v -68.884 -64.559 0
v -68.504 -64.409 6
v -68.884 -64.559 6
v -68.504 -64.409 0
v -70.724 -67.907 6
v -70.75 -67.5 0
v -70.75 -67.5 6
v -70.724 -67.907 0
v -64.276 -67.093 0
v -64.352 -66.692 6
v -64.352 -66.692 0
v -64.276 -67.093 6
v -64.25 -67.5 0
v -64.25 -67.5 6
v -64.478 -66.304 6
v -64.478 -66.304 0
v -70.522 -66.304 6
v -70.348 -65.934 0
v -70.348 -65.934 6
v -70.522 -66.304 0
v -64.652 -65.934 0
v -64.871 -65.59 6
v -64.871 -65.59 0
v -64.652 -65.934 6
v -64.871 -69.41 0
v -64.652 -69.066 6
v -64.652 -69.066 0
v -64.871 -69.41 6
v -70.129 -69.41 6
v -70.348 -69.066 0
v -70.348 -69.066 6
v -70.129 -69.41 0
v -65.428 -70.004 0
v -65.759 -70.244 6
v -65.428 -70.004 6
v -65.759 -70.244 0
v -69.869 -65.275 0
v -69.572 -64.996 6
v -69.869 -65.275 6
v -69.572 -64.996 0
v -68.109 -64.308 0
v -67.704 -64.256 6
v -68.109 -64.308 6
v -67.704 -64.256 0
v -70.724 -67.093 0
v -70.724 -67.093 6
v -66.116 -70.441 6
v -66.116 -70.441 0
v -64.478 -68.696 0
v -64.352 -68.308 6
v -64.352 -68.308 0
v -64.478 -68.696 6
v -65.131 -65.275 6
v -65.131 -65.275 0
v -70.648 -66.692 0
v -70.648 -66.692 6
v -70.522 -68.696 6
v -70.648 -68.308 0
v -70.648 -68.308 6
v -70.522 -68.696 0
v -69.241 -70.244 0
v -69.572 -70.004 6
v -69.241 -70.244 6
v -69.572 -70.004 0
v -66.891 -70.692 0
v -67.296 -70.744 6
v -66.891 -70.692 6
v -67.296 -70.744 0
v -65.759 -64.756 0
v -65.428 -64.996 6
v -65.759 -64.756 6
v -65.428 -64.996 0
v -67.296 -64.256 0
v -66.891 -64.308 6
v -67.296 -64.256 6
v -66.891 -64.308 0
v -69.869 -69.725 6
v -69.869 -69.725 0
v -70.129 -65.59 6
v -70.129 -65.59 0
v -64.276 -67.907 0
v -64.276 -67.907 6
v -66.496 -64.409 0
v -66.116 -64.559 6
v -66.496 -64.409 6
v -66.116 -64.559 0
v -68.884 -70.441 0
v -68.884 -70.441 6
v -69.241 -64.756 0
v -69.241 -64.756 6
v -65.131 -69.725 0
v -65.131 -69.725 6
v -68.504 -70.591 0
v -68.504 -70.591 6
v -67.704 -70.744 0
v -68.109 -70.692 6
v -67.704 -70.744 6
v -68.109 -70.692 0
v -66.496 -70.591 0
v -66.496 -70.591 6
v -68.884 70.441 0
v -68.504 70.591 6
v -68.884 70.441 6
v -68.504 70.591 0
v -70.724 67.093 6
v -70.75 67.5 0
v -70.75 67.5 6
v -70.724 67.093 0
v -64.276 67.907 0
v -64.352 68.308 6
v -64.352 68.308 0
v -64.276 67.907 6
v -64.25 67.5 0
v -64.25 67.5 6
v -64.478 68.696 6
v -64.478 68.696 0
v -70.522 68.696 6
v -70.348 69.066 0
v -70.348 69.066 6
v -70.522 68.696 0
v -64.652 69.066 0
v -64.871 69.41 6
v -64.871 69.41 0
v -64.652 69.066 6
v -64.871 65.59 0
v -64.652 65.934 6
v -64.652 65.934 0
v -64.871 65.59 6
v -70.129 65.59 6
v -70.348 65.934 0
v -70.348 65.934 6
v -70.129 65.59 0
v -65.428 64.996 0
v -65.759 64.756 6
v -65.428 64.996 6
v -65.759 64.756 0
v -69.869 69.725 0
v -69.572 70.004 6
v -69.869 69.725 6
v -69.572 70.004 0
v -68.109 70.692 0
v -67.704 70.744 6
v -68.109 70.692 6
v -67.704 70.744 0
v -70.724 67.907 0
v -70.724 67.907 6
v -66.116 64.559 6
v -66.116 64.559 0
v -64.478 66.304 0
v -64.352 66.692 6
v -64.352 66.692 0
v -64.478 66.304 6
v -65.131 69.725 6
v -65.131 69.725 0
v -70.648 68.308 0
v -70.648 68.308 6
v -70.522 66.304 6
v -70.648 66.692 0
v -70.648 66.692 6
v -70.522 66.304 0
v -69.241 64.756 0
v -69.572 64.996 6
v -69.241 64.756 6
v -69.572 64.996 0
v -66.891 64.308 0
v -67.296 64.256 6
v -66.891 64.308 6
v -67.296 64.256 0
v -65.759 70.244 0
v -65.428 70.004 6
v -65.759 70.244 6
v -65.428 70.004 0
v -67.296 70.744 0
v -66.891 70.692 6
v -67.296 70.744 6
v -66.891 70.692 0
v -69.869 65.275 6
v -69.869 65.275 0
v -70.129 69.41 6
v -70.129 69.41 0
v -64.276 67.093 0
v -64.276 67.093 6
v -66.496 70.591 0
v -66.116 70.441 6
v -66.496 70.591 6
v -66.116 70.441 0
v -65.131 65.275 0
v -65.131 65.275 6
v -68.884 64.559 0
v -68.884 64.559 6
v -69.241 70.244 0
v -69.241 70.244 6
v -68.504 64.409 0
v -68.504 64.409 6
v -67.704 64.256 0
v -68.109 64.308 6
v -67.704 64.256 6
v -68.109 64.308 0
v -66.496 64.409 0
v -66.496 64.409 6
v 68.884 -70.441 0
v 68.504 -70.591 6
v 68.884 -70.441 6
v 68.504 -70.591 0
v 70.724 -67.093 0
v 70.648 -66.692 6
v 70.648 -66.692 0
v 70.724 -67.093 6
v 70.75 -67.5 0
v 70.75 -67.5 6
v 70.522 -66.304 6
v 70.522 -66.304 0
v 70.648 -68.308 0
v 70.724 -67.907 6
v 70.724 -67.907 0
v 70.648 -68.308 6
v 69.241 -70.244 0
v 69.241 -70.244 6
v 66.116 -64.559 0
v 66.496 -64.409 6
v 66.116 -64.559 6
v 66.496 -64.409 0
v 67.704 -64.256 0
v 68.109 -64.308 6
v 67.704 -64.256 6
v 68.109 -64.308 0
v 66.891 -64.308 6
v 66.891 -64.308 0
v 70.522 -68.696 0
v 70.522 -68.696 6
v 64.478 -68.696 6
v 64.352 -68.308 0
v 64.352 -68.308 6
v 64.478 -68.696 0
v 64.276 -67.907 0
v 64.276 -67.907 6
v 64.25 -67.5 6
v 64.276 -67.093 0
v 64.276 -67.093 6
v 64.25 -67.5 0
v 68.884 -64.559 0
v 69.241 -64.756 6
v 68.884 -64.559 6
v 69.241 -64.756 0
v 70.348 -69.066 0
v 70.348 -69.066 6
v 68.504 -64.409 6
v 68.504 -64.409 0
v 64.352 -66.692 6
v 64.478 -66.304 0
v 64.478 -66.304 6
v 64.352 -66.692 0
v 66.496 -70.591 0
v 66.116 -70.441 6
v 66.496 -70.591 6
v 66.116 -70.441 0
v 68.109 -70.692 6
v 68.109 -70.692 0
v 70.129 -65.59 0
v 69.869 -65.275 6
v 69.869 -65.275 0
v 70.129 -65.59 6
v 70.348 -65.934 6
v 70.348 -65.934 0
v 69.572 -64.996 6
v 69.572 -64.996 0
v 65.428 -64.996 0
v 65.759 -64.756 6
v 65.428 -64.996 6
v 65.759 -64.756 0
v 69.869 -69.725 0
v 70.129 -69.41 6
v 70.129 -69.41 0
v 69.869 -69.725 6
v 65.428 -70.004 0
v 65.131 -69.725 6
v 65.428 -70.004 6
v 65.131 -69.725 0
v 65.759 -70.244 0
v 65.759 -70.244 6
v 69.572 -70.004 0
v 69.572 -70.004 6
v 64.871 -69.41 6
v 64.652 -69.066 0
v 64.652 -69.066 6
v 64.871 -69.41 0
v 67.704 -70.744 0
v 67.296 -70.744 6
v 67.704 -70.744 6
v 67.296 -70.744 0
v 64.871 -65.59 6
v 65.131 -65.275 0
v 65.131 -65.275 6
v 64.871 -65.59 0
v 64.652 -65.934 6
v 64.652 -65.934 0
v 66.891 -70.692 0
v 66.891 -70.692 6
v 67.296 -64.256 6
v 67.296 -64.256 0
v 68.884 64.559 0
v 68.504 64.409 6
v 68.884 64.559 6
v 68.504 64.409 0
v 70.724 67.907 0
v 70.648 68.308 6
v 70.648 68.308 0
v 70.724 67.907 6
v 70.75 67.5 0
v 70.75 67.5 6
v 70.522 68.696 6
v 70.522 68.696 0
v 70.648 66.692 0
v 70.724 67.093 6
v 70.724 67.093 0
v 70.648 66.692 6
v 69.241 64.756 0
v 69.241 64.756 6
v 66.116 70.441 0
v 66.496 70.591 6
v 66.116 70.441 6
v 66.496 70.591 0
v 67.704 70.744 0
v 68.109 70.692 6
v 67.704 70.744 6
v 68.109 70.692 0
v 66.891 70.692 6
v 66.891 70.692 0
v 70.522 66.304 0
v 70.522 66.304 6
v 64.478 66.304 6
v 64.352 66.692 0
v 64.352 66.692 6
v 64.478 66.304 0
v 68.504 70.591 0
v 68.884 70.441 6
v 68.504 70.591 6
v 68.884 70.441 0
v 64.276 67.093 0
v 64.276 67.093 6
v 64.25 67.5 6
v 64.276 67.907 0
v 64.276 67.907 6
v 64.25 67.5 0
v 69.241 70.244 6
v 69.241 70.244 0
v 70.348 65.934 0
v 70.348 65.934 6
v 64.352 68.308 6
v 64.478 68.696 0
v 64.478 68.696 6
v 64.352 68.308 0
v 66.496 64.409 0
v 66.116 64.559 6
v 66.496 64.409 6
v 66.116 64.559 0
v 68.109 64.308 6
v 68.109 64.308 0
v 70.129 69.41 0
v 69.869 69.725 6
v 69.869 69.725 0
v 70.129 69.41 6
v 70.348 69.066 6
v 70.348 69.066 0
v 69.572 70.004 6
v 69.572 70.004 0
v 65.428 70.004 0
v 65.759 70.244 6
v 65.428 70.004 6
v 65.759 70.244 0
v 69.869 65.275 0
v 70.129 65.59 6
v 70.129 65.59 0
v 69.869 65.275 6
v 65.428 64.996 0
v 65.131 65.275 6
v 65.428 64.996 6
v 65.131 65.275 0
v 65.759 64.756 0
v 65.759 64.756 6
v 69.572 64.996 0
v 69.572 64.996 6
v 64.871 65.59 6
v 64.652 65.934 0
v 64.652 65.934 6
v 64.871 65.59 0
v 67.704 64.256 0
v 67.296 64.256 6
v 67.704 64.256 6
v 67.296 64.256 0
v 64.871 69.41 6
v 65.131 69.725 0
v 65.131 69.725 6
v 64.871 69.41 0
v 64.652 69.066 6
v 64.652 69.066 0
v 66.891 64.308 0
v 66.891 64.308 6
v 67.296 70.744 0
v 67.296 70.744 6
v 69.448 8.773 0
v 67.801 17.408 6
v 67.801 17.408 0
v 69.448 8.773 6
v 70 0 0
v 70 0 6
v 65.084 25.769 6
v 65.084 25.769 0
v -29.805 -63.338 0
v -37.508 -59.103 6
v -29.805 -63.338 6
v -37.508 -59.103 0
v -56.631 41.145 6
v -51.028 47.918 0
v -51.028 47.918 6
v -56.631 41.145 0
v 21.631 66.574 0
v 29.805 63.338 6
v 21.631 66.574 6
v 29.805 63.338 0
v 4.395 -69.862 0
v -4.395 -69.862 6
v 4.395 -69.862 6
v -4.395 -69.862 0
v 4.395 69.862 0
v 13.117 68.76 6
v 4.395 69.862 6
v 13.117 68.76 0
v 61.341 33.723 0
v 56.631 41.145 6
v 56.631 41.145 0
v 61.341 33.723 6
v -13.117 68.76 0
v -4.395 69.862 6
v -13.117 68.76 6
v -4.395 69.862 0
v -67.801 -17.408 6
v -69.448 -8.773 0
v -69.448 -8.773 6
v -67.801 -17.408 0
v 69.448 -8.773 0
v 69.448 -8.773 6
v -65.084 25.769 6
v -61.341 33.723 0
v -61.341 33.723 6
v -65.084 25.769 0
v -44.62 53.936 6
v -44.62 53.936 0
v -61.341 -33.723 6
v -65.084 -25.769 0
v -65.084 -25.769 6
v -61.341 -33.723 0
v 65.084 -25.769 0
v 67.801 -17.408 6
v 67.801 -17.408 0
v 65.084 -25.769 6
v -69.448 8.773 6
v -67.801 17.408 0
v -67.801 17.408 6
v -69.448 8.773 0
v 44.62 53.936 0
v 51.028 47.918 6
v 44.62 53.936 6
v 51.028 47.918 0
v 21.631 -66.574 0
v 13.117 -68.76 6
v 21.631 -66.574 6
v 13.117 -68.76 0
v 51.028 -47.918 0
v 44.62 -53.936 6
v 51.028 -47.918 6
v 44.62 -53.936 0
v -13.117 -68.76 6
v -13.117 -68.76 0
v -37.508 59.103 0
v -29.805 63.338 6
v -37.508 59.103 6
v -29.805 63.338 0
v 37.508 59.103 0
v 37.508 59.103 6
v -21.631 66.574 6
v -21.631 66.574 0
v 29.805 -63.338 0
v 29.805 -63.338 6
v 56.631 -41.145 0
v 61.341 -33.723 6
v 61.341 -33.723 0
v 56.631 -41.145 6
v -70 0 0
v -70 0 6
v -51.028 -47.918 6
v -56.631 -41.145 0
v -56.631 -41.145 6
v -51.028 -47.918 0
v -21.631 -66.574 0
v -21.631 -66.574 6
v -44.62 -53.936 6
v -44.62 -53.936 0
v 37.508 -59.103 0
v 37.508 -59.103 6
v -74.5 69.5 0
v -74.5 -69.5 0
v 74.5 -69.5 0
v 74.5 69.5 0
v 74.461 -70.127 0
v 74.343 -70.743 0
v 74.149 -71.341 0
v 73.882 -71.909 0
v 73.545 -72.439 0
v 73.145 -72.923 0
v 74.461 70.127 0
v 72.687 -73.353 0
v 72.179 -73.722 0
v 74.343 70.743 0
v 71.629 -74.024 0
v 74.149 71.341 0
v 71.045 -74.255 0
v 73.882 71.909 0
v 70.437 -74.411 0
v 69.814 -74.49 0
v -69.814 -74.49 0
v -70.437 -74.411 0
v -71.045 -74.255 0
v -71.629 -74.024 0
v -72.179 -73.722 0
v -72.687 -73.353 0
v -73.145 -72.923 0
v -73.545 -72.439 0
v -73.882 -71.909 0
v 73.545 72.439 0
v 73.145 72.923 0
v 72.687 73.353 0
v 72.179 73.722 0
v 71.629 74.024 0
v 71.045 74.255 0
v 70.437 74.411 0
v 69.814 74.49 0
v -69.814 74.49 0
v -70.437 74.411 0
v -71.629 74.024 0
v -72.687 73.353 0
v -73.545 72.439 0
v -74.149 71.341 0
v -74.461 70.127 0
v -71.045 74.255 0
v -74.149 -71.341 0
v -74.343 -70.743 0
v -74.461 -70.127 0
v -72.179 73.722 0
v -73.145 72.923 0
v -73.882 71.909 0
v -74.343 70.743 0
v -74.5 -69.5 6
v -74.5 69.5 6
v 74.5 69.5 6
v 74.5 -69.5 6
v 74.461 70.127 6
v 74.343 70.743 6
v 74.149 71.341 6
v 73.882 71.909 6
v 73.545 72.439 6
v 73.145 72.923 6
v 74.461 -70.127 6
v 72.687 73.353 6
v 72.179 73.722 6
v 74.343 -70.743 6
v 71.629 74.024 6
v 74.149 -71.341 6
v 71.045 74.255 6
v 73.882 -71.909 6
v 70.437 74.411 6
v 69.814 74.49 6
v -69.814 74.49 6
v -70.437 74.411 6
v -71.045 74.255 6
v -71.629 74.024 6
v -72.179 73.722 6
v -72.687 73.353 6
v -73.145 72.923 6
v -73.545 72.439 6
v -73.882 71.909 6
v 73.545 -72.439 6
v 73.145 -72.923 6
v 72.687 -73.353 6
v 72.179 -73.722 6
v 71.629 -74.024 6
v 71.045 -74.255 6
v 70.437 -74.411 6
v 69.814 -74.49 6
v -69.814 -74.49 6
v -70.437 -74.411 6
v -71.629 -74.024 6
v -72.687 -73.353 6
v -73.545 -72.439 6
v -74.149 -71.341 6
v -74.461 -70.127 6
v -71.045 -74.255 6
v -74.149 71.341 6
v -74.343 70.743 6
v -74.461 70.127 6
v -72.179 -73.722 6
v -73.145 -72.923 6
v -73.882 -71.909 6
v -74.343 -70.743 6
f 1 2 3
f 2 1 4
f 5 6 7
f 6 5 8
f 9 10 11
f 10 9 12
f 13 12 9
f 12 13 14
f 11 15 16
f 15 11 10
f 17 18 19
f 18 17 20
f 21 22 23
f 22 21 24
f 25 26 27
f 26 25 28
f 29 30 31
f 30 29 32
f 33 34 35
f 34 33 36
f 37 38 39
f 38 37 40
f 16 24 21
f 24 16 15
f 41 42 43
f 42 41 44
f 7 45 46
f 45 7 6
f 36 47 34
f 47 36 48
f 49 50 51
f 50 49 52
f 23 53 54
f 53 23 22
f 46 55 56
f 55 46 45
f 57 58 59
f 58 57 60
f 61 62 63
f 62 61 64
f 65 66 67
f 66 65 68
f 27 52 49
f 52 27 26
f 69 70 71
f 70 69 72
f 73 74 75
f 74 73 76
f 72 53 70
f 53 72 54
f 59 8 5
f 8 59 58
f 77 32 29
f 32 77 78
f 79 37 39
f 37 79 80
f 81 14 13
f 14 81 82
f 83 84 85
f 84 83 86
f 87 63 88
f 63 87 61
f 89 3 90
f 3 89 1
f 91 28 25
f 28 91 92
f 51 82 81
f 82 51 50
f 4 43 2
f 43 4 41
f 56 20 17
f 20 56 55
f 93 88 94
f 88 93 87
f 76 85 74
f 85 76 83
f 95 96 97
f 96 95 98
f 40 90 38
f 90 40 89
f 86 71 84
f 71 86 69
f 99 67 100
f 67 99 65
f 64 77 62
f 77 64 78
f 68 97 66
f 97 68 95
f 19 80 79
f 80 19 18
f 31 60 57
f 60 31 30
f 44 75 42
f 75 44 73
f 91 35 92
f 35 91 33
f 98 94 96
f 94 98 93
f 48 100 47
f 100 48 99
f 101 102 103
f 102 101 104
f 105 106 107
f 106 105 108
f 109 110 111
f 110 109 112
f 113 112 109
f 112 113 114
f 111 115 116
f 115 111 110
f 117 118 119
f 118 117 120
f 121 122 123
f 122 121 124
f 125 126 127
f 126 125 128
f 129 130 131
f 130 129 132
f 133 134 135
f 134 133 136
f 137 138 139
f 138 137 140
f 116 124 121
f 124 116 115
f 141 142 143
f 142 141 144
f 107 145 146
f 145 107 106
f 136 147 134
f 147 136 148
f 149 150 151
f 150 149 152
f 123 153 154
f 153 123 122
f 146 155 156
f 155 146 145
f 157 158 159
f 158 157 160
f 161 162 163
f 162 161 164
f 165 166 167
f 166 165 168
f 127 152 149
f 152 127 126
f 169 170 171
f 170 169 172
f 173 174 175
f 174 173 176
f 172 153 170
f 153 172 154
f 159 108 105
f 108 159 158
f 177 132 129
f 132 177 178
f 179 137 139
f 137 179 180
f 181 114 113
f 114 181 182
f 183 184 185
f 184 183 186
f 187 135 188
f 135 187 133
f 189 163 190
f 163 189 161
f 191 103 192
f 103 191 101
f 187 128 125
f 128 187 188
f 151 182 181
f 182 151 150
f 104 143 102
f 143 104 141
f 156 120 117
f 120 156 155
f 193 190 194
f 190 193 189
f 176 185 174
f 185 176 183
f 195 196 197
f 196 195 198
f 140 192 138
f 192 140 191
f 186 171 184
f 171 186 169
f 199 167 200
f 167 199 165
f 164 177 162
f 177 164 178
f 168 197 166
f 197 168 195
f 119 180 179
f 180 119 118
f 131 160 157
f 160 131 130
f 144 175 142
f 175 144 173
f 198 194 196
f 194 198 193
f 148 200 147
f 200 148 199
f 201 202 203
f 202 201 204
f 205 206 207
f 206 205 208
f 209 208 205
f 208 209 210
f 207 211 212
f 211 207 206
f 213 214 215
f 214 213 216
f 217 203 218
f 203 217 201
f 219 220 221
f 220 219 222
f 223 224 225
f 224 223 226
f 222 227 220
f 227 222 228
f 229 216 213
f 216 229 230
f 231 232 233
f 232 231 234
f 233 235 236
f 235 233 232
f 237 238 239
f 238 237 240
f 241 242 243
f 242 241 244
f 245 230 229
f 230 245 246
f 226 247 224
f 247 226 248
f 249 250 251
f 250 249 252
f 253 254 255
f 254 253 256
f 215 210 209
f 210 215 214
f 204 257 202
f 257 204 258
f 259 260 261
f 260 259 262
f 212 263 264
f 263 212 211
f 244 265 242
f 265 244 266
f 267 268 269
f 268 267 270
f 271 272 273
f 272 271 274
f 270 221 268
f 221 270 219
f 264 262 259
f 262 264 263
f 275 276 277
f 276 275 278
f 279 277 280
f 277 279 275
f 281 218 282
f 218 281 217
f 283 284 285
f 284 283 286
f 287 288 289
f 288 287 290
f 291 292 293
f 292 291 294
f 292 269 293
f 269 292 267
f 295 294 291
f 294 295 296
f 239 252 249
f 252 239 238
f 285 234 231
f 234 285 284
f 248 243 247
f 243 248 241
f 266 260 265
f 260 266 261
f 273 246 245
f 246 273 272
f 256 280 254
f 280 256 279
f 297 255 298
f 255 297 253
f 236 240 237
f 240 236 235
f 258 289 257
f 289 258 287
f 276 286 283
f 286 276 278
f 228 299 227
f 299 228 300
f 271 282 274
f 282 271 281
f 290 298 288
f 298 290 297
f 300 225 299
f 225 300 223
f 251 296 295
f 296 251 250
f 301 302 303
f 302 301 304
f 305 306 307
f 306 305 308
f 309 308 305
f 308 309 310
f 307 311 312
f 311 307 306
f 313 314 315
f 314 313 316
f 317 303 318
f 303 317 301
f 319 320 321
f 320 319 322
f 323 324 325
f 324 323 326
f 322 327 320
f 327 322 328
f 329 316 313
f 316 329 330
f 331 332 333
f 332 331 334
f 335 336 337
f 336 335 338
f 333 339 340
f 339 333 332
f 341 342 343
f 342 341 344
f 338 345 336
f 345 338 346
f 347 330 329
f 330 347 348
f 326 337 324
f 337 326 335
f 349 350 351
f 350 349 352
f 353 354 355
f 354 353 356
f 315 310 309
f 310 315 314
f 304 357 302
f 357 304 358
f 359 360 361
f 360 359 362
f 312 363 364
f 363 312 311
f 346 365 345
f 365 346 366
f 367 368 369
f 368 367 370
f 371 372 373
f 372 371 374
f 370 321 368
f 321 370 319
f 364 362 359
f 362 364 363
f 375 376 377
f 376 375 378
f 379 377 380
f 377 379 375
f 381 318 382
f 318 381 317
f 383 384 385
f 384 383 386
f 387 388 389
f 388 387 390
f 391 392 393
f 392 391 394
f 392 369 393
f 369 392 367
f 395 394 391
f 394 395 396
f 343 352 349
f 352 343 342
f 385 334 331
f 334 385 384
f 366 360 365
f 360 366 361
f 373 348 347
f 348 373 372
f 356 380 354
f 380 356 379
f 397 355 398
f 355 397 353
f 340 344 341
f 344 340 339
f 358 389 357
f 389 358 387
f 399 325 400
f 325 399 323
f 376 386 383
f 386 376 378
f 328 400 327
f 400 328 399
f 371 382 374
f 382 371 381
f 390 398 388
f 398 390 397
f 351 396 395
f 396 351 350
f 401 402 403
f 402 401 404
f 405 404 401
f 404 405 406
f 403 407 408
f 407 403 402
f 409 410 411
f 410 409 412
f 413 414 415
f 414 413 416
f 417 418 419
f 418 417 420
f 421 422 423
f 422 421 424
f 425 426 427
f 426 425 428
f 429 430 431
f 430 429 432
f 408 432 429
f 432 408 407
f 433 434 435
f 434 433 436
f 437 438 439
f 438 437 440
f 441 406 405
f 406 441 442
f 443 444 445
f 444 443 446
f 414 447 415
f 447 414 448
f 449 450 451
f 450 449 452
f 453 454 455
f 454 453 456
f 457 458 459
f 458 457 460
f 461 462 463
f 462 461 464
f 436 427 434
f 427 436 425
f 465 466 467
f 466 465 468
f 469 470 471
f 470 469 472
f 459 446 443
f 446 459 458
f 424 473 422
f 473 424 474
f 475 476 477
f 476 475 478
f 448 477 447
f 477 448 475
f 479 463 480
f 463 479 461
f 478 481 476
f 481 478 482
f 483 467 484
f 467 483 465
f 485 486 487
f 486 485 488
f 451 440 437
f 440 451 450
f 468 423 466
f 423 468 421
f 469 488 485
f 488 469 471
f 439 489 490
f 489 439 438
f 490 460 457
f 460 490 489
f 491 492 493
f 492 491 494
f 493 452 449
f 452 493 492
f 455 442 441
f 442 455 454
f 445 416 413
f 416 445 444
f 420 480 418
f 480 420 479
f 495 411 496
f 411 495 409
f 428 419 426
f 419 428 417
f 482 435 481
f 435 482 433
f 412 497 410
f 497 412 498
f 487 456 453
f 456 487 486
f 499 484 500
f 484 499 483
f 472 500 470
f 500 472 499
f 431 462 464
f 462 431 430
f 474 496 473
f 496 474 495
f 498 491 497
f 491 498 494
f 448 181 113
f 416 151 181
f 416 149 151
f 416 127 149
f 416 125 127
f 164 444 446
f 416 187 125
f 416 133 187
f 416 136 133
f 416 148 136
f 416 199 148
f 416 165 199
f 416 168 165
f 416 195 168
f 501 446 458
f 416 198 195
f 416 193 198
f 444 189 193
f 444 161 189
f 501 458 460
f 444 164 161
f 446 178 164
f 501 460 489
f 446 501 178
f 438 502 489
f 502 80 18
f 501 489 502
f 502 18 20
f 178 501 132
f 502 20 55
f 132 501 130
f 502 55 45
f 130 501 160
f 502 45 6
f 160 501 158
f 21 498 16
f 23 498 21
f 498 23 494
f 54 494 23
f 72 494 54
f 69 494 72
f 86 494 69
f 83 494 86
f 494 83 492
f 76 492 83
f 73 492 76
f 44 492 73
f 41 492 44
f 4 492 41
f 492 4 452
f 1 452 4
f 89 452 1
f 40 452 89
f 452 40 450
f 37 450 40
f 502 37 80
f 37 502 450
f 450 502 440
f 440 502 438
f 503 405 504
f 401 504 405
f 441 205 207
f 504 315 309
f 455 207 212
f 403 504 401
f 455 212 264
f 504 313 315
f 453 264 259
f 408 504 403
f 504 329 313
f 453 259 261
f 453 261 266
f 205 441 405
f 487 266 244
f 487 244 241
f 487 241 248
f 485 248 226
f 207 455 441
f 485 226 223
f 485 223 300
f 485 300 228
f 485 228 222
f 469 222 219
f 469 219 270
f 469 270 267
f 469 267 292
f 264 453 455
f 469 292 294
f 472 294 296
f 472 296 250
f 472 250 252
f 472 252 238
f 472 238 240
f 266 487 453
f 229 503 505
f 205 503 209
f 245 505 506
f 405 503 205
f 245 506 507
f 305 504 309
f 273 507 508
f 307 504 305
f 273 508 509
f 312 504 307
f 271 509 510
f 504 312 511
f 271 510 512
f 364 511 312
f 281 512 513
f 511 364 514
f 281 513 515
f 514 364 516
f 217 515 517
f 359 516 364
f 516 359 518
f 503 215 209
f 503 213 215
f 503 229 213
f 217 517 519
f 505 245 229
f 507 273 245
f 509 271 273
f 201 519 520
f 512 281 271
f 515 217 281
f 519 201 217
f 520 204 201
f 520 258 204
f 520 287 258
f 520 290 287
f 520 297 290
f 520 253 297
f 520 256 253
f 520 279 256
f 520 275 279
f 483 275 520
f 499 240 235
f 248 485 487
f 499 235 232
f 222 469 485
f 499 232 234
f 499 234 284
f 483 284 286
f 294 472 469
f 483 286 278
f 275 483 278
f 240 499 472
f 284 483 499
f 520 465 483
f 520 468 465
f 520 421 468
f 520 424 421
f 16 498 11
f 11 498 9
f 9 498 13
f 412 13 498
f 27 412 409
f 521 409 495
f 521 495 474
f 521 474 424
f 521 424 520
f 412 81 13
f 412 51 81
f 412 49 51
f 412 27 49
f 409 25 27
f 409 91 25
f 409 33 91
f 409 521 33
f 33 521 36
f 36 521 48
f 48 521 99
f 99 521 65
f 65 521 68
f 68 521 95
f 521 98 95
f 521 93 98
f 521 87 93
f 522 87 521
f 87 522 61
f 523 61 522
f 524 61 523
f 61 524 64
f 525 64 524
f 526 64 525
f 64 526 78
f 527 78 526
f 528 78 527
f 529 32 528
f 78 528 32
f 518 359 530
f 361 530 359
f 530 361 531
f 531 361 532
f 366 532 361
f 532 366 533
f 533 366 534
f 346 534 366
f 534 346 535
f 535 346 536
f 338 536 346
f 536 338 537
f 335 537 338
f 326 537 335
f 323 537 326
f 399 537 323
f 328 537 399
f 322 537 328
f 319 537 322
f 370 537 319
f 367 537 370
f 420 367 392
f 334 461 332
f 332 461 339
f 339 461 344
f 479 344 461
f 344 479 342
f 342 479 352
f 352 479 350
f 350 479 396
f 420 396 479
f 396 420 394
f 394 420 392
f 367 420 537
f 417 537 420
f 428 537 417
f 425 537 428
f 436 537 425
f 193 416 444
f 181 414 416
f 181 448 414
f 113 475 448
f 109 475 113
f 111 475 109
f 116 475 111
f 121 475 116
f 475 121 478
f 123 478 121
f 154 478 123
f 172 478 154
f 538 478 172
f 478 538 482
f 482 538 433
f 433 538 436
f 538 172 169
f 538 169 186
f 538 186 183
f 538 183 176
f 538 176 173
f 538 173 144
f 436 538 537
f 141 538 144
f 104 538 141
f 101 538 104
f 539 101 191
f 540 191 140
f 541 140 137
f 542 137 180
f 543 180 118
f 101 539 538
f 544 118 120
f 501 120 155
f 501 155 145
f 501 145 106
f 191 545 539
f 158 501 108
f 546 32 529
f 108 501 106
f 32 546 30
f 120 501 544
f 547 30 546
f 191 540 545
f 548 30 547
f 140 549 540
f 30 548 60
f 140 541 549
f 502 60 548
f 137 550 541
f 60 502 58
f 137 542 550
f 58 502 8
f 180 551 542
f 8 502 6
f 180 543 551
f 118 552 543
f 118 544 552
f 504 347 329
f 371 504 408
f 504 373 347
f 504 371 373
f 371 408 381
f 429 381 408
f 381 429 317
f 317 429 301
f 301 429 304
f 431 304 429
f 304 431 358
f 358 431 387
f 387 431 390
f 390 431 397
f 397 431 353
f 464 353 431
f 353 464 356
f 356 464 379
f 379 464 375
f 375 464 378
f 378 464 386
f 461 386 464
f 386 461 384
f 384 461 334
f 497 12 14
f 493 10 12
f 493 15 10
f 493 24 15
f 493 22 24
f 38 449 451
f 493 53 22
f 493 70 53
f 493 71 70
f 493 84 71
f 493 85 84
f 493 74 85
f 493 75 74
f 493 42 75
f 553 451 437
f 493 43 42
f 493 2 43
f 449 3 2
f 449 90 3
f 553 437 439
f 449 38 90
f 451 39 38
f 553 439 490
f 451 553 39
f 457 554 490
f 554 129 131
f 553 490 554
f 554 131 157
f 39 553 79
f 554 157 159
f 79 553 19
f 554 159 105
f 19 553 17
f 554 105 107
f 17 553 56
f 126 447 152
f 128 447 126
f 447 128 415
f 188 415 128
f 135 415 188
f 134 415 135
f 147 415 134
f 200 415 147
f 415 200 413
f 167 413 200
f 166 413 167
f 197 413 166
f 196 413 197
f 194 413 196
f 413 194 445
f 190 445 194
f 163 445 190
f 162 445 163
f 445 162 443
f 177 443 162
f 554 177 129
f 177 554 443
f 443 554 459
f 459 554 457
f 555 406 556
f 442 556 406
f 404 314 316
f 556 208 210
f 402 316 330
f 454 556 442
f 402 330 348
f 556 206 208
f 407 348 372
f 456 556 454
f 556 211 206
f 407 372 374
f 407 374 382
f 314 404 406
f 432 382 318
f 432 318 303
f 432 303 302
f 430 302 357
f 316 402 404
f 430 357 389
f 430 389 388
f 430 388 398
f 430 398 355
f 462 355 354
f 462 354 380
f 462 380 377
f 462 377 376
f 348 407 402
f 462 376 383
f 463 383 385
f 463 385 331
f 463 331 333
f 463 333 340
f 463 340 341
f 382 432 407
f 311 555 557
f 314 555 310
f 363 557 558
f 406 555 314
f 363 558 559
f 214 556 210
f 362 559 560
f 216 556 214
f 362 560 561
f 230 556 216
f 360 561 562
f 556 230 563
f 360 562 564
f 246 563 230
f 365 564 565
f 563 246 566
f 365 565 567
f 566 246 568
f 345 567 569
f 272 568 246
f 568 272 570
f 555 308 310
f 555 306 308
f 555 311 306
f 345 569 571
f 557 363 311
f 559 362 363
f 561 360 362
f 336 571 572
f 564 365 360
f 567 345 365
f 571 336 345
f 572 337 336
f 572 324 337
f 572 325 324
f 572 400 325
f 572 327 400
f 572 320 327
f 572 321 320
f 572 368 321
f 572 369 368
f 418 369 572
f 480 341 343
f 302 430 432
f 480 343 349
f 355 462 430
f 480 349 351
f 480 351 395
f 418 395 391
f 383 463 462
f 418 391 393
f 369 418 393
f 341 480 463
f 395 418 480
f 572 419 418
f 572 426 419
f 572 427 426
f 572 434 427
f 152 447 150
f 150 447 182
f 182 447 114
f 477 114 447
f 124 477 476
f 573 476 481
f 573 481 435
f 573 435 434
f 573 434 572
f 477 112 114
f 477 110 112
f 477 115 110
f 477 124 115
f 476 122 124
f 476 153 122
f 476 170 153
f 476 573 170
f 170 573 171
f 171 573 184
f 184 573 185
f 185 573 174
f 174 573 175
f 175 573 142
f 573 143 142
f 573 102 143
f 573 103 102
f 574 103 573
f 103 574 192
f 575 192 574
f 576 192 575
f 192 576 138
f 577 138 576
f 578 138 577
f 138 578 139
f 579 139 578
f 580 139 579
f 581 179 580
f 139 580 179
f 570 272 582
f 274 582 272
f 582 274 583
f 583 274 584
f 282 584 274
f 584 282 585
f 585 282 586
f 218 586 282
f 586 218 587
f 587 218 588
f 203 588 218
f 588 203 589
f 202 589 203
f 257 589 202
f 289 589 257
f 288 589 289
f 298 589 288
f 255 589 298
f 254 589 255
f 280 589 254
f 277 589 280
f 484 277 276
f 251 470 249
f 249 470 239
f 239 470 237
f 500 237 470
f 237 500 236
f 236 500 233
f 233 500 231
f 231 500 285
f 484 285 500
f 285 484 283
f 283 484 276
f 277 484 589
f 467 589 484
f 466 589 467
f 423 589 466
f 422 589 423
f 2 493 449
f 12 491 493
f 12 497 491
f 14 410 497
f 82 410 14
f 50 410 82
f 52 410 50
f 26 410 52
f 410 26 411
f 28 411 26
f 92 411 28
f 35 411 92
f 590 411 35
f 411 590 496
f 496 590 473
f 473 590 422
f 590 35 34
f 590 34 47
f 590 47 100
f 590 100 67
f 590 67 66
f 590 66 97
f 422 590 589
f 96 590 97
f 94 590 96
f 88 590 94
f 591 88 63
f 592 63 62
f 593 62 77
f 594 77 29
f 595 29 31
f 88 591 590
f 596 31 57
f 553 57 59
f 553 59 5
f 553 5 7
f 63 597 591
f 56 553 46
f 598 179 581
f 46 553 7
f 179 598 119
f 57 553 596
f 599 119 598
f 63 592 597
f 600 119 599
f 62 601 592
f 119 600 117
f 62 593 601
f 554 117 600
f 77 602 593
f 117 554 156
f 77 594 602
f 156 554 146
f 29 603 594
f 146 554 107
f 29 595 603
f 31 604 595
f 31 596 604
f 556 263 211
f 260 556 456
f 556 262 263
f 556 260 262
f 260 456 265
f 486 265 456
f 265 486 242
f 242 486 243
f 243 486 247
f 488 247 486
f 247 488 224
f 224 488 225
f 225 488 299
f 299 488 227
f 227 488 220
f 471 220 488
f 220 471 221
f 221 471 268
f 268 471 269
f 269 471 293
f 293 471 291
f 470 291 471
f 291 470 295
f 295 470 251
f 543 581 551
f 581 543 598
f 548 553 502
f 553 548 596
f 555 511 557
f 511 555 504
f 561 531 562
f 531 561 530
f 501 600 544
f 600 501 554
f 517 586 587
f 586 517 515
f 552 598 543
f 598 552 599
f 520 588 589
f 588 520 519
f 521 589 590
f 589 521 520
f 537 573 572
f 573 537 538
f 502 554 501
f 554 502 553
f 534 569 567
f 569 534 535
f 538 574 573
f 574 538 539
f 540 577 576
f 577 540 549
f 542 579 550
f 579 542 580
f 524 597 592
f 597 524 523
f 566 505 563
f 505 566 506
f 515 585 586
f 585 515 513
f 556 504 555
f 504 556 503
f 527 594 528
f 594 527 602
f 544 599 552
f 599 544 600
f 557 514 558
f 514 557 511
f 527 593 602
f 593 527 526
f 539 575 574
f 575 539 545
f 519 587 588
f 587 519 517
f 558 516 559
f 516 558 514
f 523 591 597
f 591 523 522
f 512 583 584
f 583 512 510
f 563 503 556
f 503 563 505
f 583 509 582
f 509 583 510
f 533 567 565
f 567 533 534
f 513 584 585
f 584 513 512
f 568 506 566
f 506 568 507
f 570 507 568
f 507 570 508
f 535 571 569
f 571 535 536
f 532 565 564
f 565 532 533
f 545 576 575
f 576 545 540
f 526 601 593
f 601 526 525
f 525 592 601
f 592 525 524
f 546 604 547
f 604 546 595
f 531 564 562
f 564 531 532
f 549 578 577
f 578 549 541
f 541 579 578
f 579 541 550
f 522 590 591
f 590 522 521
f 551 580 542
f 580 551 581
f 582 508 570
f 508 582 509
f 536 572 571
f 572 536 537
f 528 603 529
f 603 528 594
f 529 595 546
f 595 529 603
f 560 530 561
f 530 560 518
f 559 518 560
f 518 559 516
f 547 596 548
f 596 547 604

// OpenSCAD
$fn = 50;

difference() {
	union() {
		hull() {
			translate(v = [-69.5, 69.5, 0]) {
				cylinder(h = 6, r = 5);
			}
			translate(v = [69.5, 69.5, 0]) {
				cylinder(h = 6, r = 5);
			}
			translate(v = [-69.5, -69.5, 0]) {
				cylinder(h = 6, r = 5);
			}
			translate(v = [69.5, -69.5, 0]) {
				cylinder(h = 6, r = 5);
			}
		}
	}
	union() {
		translate(v = [-67.5, -67.5, -100.0]) {
			cylinder(h = 200, r = 3.25);
		}
		translate(v = [-67.5, 67.5, -100.0]) {
			cylinder(h = 200, r = 3.25);
		}
		translate(v = [67.5, -67.5, -100.0]) {
			cylinder(h = 200, r = 3.25);
		}
		translate(v = [67.5, 67.5, -100.0]) {
			cylinder(h = 200, r = 3.25);
		}
		translate(v = [-67.5, -67.5, -100.0]) {
			cylinder(h = 200, r = 1.8);
		}
		translate(v = [-67.5, 67.5, -100.0]) {
			cylinder(h = 200, r = 1.8);
		}
		translate(v = [67.5, -67.5, -100.0]) {
			cylinder(h = 200, r = 1.8);
		}
		translate(v = [67.5, 67.5, -100.0]) {
			cylinder(h = 200, r = 1.8);
		}
		cylinder(h = 6, r = 70.0);
	}
}
